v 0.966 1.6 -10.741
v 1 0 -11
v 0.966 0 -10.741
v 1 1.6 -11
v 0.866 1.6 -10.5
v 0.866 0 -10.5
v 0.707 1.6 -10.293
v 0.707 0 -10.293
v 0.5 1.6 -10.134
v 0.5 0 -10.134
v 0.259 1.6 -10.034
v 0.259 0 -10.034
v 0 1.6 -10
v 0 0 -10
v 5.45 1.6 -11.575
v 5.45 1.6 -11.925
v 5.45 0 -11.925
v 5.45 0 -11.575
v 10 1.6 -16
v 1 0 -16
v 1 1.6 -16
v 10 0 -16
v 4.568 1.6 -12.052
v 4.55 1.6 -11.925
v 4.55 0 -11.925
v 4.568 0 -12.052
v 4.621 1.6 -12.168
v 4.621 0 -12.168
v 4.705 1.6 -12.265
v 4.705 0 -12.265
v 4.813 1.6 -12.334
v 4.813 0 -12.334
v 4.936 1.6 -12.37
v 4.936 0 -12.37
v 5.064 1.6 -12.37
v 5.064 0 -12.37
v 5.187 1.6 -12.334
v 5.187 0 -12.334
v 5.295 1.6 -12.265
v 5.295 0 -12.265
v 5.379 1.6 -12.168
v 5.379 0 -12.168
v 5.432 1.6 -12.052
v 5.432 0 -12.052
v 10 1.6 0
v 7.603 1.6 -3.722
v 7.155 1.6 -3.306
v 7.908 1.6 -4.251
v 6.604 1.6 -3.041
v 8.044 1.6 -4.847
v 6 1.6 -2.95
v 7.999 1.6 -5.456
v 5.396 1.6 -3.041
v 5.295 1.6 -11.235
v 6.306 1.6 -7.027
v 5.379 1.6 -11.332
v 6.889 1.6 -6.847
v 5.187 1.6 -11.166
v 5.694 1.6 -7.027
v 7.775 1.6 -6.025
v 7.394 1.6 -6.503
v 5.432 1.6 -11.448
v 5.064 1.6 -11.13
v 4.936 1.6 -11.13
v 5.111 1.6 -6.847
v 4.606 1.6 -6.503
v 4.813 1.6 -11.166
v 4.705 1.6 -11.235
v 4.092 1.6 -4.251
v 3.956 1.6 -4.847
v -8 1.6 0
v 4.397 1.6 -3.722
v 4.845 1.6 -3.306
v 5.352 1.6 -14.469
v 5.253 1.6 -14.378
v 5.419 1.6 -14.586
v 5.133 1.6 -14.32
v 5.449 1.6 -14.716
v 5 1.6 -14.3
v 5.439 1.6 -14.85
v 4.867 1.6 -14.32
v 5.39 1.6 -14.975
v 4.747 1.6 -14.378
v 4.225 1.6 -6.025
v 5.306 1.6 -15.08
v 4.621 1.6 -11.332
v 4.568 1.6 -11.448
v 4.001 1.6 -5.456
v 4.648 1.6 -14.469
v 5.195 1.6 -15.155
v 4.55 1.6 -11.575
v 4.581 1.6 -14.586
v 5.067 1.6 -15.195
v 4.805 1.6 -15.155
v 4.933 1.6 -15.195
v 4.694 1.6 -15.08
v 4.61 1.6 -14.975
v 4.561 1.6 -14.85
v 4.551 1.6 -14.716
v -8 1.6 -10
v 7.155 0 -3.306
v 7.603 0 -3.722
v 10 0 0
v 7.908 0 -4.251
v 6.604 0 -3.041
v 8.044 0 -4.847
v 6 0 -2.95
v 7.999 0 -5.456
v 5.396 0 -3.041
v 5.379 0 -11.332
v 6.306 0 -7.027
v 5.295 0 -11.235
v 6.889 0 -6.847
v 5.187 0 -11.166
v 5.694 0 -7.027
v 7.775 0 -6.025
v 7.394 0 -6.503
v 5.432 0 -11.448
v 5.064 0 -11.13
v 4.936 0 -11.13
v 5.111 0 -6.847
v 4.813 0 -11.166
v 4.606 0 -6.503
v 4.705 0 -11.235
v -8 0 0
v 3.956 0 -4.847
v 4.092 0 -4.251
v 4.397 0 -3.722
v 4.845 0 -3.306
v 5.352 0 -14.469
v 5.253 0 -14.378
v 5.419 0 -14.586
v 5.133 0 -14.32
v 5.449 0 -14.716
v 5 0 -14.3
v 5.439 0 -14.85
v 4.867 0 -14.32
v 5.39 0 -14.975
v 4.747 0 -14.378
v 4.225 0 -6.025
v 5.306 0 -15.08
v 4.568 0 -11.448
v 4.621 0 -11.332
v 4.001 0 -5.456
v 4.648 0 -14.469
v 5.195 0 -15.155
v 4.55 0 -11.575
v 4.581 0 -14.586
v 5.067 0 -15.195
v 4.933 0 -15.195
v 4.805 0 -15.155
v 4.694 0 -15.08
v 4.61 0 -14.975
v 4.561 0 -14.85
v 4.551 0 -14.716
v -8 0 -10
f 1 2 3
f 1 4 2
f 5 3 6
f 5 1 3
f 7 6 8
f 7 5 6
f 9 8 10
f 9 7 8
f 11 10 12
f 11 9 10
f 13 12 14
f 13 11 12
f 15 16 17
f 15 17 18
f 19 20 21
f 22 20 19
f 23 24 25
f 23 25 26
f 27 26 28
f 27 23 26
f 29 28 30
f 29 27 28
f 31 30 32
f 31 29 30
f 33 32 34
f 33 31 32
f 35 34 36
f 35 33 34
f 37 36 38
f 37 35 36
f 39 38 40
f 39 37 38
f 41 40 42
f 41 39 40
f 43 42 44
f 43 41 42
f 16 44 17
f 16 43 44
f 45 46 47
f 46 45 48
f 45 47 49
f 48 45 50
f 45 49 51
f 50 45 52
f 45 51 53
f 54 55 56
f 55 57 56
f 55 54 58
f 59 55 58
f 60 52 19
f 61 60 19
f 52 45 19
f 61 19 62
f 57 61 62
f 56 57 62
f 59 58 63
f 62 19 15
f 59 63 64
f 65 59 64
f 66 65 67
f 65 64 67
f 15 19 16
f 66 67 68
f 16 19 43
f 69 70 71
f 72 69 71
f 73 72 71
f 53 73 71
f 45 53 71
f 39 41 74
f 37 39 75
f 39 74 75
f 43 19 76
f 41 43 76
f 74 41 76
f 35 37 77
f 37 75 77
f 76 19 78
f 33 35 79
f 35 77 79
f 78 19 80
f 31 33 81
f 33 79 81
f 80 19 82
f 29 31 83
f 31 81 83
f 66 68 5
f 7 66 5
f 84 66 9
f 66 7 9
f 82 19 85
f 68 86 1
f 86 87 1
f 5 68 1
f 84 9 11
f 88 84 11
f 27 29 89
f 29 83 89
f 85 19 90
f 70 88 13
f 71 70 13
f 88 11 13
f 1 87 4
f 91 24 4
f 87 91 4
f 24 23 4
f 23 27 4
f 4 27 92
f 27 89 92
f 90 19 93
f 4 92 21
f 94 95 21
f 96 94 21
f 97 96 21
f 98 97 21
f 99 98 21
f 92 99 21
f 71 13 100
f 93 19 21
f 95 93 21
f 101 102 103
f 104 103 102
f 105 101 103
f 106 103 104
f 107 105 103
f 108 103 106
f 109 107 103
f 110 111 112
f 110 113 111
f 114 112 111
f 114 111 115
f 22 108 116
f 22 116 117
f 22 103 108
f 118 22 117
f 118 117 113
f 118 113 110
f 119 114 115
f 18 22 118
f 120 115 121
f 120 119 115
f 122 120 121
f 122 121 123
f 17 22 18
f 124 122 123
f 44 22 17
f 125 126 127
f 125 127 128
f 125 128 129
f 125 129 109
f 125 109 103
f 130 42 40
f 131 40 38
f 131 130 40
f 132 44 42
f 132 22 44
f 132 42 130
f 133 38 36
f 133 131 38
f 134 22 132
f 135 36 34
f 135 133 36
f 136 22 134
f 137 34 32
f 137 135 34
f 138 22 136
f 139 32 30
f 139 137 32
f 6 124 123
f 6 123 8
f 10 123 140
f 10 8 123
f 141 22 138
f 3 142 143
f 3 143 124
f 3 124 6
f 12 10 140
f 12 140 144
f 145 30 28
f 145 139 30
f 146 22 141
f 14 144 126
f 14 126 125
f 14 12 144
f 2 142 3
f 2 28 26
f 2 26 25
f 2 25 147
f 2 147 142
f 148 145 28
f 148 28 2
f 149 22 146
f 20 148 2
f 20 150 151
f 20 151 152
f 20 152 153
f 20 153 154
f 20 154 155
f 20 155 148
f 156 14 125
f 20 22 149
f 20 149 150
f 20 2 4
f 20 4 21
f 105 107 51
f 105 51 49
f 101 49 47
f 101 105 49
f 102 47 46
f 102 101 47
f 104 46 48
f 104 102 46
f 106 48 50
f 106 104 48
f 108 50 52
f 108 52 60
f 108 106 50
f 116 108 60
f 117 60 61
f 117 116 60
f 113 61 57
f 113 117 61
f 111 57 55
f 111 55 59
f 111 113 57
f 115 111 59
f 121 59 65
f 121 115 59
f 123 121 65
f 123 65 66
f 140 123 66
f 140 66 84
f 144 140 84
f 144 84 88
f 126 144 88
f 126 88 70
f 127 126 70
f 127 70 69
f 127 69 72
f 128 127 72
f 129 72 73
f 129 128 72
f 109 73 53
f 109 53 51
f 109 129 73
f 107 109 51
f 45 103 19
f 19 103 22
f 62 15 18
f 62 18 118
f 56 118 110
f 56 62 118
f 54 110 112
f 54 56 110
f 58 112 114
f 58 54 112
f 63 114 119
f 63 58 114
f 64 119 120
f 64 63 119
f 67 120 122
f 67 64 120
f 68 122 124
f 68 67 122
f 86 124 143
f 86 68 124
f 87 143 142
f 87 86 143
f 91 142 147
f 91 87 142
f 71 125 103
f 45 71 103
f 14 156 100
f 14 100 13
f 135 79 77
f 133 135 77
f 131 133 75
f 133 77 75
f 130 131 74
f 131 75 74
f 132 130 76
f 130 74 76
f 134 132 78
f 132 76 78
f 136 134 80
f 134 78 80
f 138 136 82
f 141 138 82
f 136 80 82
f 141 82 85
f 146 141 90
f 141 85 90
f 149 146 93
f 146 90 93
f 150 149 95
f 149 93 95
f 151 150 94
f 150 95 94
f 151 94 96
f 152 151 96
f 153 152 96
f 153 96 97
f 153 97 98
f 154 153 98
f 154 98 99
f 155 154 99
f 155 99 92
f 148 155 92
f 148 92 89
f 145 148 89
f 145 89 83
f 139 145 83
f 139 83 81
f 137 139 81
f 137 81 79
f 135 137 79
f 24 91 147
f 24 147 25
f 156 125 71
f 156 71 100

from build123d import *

# Parameters (mm, degrees)
SKETCH1_R           = 2.05
BOSS_EXTRUDE1_DEPTH = 1.6
SKETCH2_R           = 0.45
CUT_EXTRUDE1_DEPTH  = 19.935680606
FILLET1_R           = 1


with BuildPart() as part:
    # Sketch1 → Boss-Extrude1 (new body)
    with BuildSketch(Plane(origin=(0, 0, 0), x_dir=(1, 0, 0), z_dir=(0, 1, 0))):
        Polygon((1, 10), (1, 16), (10, 16), (10, 8), (10, 0), (0, 0), (-8, 0), (-8, 10), align=None)
        with Locations(Location((6, 5, 0), (0, 0, 270))):
            Circle(SKETCH1_R, mode=Mode.SUBTRACT)
    extrude(amount=BOSS_EXTRUDE1_DEPTH)

    # Sketch2 → Cut-Extrude1 (cut, through all)
    with BuildSketch(Plane(origin=(0, 1.6, 0), x_dir=(1, 0, 0), z_dir=(0, 1, 0))):
        with Locations(Location((5, 14.75, 0), (0, 0, 270))):
            Circle(SKETCH2_R)
        with BuildLine():
            Line((4.55, 11.575), (4.55, 11.925))
            ThreePointArc((4.55, 11.925), (5, 12.375), (5.45, 11.925))
            Line((5.45, 11.925), (5.45, 11.575))
            ThreePointArc((5.45, 11.575), (5, 11.125), (4.55, 11.575))
        make_face()
    extrude(amount=-CUT_EXTRUDE1_DEPTH, mode=Mode.SUBTRACT)

    # Fillet1
    fillet1_edges = [part.edges().sort_by_distance(p)[0] for p in [
        (1, 0.8, -10),
    ]]
    fillet(fillet1_edges, radius=FILLET1_R)


solid = part.part
